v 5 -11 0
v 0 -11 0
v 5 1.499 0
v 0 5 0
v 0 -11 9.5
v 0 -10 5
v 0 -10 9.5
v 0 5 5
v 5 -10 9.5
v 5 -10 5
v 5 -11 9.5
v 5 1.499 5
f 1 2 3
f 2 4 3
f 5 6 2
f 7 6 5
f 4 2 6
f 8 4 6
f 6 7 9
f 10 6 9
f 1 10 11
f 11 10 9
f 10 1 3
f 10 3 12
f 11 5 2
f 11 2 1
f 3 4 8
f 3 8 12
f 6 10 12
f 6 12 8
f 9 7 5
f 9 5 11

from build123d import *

# Parameters (mm, degrees)
BOSS_EXTRUDE1_DEPTH = 5
SKETCH2_W           = 5
SKETCH2_H           = 9.5
BOSS_EXTRUDE2_DEPTH = 1


with BuildPart() as part:
    # Sketch1 → Boss-Extrude1 (new body)
    with BuildSketch(Plane.XY):
        Polygon((0, 0), (0, 5), (5, 1.498962309), (5, -10), (0, -10), align=None)
    extrude(amount=BOSS_EXTRUDE1_DEPTH)

    # Sketch2 → Boss-Extrude2 (add)
    with BuildSketch(Plane.XZ.offset(10)):
        with Locations((2.5, 4.75)):
            Rectangle(SKETCH2_W, SKETCH2_H)
    extrude(amount=BOSS_EXTRUDE2_DEPTH)


solid = part.part
